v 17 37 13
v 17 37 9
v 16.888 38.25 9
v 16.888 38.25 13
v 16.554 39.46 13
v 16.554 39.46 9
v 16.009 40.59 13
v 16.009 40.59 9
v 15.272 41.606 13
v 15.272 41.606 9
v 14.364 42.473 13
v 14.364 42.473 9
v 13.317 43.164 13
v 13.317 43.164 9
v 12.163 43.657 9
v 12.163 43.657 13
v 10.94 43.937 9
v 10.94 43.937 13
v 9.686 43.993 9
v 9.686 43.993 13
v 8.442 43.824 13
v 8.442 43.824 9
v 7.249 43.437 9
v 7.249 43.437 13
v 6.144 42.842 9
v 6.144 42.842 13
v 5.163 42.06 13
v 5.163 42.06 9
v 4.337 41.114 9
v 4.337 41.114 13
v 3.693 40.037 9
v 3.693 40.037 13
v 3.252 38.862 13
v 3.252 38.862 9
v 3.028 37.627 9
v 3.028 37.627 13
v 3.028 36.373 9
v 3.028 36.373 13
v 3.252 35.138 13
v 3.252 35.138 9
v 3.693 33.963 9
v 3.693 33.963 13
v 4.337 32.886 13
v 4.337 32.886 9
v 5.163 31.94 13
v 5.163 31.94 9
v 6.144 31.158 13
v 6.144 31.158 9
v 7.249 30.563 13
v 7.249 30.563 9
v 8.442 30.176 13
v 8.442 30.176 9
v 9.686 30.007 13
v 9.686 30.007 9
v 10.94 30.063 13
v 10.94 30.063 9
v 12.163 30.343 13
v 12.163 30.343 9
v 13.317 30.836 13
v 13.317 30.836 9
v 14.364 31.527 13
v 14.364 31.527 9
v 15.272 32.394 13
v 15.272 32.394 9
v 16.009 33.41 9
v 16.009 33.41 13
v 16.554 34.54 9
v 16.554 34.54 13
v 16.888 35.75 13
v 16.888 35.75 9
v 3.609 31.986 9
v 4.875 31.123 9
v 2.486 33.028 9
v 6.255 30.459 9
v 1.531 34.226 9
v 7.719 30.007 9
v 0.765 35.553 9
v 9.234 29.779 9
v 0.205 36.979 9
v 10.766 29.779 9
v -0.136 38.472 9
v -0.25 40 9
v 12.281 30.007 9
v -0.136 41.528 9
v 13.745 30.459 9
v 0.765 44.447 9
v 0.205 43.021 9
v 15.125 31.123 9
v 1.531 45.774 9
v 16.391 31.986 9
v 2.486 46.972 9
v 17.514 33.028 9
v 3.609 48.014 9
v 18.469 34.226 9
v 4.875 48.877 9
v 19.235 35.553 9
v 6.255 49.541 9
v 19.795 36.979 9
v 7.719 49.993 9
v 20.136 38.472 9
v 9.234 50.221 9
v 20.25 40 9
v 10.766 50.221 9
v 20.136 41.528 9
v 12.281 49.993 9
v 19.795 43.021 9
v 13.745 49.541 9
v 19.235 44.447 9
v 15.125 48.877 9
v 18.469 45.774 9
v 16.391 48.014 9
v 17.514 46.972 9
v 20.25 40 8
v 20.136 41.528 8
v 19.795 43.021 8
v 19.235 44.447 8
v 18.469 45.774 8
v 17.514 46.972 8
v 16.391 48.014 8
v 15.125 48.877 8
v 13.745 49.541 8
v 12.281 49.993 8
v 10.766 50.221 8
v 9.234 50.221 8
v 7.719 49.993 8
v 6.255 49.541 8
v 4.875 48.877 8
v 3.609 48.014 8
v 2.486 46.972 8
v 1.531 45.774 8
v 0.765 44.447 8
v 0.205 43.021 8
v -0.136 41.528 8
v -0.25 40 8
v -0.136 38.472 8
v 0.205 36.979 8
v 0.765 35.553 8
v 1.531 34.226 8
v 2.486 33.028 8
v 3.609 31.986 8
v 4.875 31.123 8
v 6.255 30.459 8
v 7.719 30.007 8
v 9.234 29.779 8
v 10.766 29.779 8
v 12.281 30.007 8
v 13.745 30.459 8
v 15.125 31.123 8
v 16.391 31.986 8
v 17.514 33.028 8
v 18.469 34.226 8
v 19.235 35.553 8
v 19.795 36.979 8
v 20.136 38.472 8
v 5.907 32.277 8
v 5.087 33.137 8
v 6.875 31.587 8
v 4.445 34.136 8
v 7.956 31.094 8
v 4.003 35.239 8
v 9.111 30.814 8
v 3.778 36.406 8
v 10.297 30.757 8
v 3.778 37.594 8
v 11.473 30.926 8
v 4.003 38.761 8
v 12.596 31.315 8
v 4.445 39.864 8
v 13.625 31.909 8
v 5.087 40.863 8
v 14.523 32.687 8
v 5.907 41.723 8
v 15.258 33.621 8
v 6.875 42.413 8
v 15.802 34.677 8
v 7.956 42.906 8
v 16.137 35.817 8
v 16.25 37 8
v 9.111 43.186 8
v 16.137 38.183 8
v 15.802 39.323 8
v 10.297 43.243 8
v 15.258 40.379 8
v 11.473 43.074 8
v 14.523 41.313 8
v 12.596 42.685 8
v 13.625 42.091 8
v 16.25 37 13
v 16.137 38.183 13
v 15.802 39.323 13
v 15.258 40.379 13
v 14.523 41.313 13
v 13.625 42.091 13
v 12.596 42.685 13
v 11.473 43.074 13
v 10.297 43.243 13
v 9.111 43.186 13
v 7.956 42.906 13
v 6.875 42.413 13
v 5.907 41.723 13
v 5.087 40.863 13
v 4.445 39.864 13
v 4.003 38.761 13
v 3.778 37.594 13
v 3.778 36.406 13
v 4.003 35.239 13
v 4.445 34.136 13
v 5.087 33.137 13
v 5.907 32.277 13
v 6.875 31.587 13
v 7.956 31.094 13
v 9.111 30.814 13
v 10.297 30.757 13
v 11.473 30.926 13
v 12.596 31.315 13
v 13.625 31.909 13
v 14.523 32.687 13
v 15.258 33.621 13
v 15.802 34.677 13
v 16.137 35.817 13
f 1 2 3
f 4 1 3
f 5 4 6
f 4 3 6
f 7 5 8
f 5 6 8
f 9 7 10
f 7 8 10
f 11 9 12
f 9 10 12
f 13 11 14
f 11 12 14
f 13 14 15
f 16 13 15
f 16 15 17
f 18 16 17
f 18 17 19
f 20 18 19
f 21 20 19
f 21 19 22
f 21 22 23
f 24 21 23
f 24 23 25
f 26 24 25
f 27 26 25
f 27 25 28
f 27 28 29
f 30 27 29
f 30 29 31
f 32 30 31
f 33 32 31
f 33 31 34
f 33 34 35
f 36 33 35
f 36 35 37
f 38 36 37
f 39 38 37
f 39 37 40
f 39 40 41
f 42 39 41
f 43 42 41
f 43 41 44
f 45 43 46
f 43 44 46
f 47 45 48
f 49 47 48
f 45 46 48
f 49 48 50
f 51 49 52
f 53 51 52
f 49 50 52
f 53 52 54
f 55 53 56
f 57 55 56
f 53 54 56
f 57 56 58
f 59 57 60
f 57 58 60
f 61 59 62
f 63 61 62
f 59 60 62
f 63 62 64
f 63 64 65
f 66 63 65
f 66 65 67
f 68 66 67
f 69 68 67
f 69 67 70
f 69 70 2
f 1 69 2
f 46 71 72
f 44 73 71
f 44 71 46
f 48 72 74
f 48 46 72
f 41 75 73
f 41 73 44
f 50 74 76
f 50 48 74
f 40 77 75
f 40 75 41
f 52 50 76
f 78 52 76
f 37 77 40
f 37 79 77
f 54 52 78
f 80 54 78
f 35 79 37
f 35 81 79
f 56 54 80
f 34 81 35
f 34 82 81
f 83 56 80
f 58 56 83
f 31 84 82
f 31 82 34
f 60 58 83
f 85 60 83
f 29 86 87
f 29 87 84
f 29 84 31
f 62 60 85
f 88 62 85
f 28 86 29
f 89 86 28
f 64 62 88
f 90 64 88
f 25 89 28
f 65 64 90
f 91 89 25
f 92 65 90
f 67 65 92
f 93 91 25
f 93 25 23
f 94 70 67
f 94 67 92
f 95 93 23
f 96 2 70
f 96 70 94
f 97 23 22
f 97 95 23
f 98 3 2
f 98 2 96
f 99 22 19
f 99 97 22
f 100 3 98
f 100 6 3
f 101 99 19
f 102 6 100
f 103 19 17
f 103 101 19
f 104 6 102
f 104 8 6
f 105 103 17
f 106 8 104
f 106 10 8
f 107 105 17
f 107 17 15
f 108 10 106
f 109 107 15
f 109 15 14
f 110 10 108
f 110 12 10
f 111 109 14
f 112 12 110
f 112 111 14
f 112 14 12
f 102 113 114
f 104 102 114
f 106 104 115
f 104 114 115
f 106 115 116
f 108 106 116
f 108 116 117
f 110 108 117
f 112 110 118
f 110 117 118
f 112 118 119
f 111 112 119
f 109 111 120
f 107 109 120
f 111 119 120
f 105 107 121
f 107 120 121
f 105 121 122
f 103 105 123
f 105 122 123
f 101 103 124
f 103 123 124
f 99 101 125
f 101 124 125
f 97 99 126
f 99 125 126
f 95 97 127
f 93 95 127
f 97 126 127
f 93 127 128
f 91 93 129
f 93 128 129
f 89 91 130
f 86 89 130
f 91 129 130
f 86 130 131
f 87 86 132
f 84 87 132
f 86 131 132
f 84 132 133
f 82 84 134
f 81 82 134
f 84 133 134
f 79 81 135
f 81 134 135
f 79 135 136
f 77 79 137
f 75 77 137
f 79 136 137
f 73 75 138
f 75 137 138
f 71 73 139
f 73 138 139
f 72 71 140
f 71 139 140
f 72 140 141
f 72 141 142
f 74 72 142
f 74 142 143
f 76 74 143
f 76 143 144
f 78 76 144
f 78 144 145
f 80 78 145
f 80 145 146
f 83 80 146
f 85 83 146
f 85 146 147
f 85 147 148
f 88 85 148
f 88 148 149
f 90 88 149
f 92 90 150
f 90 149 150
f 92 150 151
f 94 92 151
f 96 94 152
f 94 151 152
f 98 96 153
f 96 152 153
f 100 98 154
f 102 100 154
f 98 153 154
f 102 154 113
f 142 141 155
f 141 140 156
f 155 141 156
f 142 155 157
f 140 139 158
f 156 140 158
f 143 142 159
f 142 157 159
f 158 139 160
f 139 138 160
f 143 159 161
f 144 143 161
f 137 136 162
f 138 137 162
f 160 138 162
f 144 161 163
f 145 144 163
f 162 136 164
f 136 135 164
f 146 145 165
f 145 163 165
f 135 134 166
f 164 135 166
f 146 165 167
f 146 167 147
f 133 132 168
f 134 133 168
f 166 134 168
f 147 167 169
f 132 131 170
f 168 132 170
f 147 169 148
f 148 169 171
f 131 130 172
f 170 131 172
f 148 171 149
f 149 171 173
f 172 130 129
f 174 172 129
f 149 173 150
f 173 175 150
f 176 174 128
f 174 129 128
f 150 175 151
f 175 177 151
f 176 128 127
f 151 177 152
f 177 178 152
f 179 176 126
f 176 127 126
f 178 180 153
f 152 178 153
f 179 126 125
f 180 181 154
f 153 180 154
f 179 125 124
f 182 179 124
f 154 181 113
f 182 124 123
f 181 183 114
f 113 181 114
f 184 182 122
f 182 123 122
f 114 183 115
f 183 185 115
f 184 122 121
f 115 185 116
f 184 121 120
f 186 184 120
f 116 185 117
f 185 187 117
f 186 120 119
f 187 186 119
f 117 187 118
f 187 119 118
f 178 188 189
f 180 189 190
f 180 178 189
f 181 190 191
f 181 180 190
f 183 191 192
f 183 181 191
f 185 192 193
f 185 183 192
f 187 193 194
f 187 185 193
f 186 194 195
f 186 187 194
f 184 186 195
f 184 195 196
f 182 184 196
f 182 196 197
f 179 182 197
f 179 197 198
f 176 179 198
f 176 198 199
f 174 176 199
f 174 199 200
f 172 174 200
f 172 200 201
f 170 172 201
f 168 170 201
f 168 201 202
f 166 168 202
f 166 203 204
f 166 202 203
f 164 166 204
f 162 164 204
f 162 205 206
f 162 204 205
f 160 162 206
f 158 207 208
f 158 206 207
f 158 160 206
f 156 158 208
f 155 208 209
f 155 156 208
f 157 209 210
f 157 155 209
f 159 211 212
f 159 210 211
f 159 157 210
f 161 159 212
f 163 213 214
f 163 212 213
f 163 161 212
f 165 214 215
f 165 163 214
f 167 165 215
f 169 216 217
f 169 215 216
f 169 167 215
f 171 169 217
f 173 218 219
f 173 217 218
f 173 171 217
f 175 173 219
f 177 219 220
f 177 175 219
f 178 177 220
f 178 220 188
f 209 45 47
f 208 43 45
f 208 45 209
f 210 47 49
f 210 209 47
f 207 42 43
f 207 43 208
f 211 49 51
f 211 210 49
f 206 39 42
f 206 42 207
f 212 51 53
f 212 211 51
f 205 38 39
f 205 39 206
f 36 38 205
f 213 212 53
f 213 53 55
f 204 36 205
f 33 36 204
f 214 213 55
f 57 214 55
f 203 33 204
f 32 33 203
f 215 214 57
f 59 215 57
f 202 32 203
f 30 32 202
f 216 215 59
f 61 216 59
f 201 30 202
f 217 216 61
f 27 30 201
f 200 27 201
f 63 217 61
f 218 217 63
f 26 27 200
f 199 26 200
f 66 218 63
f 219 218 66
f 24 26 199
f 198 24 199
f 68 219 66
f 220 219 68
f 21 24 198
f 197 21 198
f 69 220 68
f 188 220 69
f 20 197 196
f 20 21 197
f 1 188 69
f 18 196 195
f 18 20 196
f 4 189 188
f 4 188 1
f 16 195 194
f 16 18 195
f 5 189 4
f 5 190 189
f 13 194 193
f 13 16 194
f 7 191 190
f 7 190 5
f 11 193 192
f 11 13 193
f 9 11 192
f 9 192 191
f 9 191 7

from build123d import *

# Parameters (mm, degrees)
CYLINDER017_R     = 6.25
CYLINDER017_DEPTH = 10
CYLINDER016_R     = 7
CYLINDER016_DEPTH = 5
CYLINDER015_R     = 10.25
CYLINDER015_DEPTH = 1


with BuildPart() as redtmp07:
    # Cylinder017 → Cylinder017 (new body)
    with BuildSketch(Plane(origin=(0, -3, 0), x_dir=(1, 0, 0), z_dir=(0, 0, 1))):
        Circle(CYLINDER017_R)
    extrude(amount=CYLINDER017_DEPTH)


with BuildPart() as redtmp06:
    # Cylinder016 → Cylinder016 (new body)
    with BuildSketch(Plane(origin=(0, -3, 0), x_dir=(1, 0, 0), z_dir=(0, 0, 1))):
        Circle(CYLINDER016_R)
    extrude(amount=CYLINDER016_DEPTH)


with BuildPart() as redtop:
    # Cylinder015 → Cylinder015 (new body)
    with BuildSketch(Plane.XY):
        Circle(CYLINDER015_R)
    extrude(amount=CYLINDER015_DEPTH)

    # Fusion001: union RedTmp06
    add(redtmp06.part)

    # Cut010: cut RedTmp07
    add(redtmp07.part, mode=Mode.SUBTRACT)


with BuildPart() as redtop_1:
    # Cut010 placement: moved
    add(redtop.part.moved(Location((10, 40, 8))))


solid = redtop_1.part
